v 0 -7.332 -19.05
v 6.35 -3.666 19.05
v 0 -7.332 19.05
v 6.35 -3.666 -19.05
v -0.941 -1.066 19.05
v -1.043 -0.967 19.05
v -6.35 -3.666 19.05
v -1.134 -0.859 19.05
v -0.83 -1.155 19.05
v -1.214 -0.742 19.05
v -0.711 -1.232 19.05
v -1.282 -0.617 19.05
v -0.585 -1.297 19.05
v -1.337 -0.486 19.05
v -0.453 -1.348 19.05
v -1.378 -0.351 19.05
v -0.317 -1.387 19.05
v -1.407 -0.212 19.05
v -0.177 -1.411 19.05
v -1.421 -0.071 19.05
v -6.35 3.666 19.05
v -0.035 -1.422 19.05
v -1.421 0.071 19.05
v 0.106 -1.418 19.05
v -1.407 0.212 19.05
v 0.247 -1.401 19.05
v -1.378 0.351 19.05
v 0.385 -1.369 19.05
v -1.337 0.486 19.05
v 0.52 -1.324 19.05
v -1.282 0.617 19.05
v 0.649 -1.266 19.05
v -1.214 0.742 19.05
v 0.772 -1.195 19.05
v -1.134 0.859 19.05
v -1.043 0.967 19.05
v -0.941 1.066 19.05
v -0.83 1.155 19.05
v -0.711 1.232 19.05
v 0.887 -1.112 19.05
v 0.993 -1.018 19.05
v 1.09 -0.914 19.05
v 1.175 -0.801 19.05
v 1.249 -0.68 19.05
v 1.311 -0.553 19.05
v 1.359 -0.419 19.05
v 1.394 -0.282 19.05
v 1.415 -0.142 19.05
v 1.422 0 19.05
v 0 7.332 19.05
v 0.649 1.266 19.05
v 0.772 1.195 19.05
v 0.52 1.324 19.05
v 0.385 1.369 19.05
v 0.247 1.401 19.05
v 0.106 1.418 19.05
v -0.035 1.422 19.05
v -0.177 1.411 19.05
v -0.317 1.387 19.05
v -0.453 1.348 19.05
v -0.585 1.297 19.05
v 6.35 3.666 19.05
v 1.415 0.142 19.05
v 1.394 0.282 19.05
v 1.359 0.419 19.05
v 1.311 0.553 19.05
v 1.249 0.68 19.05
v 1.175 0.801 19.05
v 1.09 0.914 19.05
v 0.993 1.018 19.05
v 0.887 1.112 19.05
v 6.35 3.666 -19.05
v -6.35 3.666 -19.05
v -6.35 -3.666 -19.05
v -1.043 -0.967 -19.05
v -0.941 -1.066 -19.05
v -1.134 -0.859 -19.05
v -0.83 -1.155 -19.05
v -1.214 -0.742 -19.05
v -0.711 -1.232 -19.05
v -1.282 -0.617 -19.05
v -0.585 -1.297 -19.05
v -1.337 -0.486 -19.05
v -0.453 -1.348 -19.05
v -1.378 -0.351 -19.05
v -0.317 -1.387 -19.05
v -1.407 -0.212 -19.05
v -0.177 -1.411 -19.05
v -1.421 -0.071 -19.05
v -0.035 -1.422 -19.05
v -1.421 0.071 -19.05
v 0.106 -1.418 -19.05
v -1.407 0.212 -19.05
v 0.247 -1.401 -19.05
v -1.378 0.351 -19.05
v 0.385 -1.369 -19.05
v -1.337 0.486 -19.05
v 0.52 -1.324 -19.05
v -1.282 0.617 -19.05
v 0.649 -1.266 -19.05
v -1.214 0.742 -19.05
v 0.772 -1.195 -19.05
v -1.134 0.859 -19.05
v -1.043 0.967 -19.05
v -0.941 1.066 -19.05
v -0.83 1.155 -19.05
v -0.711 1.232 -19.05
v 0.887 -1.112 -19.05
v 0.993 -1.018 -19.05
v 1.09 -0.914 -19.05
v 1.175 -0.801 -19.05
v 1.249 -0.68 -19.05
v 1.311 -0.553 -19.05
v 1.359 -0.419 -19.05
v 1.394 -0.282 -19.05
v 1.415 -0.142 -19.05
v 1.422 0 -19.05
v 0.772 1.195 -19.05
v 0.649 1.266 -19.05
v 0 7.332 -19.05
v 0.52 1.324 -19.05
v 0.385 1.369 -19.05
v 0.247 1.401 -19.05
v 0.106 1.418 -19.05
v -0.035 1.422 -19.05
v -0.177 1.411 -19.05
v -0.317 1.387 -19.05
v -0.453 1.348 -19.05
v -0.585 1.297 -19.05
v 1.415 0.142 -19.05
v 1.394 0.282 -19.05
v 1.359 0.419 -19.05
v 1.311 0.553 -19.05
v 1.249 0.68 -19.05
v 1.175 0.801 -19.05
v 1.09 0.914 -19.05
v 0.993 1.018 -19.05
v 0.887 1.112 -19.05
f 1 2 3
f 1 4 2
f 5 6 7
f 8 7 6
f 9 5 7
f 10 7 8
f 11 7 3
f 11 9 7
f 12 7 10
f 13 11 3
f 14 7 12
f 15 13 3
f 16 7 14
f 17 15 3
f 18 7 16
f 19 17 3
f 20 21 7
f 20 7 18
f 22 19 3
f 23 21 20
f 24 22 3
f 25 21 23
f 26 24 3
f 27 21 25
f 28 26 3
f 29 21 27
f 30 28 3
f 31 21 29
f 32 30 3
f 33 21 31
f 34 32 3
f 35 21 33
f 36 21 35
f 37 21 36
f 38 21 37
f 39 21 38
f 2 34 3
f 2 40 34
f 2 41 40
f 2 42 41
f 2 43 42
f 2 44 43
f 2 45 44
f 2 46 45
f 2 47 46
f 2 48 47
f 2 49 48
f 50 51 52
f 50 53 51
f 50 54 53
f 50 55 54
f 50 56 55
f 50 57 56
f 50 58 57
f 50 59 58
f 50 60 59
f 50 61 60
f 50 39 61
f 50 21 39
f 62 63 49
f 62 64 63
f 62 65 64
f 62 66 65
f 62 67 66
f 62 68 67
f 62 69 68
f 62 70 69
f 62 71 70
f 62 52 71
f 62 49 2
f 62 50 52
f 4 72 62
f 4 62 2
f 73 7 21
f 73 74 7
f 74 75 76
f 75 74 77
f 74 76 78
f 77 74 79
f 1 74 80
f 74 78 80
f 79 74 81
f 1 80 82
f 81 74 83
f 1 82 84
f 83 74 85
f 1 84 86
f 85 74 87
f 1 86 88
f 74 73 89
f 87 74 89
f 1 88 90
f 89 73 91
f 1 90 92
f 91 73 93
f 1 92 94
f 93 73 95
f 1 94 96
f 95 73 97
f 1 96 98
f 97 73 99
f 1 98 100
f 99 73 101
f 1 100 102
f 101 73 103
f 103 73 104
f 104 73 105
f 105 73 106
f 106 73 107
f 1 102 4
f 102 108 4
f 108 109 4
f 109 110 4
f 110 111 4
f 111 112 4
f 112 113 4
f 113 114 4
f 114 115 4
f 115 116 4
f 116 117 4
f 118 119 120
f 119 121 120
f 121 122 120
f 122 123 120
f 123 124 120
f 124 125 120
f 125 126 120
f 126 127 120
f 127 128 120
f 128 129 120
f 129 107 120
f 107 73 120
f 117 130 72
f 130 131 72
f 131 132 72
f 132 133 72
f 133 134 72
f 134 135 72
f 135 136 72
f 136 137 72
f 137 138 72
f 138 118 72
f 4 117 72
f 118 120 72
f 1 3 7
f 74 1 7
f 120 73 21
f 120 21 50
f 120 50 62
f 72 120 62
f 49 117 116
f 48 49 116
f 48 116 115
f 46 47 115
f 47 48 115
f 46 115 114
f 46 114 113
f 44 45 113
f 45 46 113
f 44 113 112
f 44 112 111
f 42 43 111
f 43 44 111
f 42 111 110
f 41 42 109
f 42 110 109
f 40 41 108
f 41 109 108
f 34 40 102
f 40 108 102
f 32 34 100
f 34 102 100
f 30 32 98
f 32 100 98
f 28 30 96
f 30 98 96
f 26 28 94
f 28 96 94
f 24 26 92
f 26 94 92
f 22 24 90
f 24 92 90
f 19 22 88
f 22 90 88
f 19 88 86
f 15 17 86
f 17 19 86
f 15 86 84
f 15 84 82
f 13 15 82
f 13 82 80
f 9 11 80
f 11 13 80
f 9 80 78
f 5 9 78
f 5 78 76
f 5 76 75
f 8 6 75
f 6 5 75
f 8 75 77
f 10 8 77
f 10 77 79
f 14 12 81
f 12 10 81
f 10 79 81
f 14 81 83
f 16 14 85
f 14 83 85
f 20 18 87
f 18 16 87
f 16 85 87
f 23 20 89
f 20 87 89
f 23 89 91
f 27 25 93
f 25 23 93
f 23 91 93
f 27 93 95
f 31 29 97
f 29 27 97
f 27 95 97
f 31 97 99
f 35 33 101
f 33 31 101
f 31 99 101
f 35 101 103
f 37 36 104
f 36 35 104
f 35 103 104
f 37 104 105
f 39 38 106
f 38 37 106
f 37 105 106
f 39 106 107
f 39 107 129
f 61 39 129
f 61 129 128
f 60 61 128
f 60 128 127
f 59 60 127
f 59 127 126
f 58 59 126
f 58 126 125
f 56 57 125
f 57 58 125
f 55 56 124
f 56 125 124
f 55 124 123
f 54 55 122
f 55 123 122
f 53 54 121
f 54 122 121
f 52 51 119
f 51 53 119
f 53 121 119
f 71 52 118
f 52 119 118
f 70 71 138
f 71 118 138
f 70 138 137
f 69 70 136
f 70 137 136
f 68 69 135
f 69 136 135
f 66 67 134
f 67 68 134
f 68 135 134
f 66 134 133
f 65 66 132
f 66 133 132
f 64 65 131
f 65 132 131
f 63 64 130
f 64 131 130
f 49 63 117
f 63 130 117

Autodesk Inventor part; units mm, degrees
ref_plane "YZ Plane" through (0, 0, 0) normal (1, 0, 0) x (0, 1, 0)
ref_plane "XZ Plane" through (0, 0, 0) normal (0, 1, 0) x (-1, 0, 0)
ref_plane "XY Plane" through (0, 0, 0) normal (0, 0, 1) x (1, 0, 0)
sketch "Sketch1" plane through (0, 0, 0) normal (0, 0, 1) x (1, 0, 0)
  line L0 (6.35, 3.6662) -> (6.35, -3.6662)
  line L1 (6.35, -3.6662) -> (0, -7.3323)
  line L2 (0, -7.3323) -> (-6.35, -3.6662)
  line L3 (-6.35, -3.6662) -> (-6.35, 3.6662)
  line L4 (-6.35, 3.6662) -> (0, 7.3323)
  line L5 (0, 7.3323) -> (6.35, 3.6662)
  circle A0 centre (0, 0) radius 1.4224
  dimension "d0" = 12.7
  dimension "d3" = 2.8448
extrude "Extrusion1" add sketch "Sketch1" along normal mid plane 38.1
properties part number "PIVOT,SHAFT,HEX,0.500in" material "Aluminum 6061"
